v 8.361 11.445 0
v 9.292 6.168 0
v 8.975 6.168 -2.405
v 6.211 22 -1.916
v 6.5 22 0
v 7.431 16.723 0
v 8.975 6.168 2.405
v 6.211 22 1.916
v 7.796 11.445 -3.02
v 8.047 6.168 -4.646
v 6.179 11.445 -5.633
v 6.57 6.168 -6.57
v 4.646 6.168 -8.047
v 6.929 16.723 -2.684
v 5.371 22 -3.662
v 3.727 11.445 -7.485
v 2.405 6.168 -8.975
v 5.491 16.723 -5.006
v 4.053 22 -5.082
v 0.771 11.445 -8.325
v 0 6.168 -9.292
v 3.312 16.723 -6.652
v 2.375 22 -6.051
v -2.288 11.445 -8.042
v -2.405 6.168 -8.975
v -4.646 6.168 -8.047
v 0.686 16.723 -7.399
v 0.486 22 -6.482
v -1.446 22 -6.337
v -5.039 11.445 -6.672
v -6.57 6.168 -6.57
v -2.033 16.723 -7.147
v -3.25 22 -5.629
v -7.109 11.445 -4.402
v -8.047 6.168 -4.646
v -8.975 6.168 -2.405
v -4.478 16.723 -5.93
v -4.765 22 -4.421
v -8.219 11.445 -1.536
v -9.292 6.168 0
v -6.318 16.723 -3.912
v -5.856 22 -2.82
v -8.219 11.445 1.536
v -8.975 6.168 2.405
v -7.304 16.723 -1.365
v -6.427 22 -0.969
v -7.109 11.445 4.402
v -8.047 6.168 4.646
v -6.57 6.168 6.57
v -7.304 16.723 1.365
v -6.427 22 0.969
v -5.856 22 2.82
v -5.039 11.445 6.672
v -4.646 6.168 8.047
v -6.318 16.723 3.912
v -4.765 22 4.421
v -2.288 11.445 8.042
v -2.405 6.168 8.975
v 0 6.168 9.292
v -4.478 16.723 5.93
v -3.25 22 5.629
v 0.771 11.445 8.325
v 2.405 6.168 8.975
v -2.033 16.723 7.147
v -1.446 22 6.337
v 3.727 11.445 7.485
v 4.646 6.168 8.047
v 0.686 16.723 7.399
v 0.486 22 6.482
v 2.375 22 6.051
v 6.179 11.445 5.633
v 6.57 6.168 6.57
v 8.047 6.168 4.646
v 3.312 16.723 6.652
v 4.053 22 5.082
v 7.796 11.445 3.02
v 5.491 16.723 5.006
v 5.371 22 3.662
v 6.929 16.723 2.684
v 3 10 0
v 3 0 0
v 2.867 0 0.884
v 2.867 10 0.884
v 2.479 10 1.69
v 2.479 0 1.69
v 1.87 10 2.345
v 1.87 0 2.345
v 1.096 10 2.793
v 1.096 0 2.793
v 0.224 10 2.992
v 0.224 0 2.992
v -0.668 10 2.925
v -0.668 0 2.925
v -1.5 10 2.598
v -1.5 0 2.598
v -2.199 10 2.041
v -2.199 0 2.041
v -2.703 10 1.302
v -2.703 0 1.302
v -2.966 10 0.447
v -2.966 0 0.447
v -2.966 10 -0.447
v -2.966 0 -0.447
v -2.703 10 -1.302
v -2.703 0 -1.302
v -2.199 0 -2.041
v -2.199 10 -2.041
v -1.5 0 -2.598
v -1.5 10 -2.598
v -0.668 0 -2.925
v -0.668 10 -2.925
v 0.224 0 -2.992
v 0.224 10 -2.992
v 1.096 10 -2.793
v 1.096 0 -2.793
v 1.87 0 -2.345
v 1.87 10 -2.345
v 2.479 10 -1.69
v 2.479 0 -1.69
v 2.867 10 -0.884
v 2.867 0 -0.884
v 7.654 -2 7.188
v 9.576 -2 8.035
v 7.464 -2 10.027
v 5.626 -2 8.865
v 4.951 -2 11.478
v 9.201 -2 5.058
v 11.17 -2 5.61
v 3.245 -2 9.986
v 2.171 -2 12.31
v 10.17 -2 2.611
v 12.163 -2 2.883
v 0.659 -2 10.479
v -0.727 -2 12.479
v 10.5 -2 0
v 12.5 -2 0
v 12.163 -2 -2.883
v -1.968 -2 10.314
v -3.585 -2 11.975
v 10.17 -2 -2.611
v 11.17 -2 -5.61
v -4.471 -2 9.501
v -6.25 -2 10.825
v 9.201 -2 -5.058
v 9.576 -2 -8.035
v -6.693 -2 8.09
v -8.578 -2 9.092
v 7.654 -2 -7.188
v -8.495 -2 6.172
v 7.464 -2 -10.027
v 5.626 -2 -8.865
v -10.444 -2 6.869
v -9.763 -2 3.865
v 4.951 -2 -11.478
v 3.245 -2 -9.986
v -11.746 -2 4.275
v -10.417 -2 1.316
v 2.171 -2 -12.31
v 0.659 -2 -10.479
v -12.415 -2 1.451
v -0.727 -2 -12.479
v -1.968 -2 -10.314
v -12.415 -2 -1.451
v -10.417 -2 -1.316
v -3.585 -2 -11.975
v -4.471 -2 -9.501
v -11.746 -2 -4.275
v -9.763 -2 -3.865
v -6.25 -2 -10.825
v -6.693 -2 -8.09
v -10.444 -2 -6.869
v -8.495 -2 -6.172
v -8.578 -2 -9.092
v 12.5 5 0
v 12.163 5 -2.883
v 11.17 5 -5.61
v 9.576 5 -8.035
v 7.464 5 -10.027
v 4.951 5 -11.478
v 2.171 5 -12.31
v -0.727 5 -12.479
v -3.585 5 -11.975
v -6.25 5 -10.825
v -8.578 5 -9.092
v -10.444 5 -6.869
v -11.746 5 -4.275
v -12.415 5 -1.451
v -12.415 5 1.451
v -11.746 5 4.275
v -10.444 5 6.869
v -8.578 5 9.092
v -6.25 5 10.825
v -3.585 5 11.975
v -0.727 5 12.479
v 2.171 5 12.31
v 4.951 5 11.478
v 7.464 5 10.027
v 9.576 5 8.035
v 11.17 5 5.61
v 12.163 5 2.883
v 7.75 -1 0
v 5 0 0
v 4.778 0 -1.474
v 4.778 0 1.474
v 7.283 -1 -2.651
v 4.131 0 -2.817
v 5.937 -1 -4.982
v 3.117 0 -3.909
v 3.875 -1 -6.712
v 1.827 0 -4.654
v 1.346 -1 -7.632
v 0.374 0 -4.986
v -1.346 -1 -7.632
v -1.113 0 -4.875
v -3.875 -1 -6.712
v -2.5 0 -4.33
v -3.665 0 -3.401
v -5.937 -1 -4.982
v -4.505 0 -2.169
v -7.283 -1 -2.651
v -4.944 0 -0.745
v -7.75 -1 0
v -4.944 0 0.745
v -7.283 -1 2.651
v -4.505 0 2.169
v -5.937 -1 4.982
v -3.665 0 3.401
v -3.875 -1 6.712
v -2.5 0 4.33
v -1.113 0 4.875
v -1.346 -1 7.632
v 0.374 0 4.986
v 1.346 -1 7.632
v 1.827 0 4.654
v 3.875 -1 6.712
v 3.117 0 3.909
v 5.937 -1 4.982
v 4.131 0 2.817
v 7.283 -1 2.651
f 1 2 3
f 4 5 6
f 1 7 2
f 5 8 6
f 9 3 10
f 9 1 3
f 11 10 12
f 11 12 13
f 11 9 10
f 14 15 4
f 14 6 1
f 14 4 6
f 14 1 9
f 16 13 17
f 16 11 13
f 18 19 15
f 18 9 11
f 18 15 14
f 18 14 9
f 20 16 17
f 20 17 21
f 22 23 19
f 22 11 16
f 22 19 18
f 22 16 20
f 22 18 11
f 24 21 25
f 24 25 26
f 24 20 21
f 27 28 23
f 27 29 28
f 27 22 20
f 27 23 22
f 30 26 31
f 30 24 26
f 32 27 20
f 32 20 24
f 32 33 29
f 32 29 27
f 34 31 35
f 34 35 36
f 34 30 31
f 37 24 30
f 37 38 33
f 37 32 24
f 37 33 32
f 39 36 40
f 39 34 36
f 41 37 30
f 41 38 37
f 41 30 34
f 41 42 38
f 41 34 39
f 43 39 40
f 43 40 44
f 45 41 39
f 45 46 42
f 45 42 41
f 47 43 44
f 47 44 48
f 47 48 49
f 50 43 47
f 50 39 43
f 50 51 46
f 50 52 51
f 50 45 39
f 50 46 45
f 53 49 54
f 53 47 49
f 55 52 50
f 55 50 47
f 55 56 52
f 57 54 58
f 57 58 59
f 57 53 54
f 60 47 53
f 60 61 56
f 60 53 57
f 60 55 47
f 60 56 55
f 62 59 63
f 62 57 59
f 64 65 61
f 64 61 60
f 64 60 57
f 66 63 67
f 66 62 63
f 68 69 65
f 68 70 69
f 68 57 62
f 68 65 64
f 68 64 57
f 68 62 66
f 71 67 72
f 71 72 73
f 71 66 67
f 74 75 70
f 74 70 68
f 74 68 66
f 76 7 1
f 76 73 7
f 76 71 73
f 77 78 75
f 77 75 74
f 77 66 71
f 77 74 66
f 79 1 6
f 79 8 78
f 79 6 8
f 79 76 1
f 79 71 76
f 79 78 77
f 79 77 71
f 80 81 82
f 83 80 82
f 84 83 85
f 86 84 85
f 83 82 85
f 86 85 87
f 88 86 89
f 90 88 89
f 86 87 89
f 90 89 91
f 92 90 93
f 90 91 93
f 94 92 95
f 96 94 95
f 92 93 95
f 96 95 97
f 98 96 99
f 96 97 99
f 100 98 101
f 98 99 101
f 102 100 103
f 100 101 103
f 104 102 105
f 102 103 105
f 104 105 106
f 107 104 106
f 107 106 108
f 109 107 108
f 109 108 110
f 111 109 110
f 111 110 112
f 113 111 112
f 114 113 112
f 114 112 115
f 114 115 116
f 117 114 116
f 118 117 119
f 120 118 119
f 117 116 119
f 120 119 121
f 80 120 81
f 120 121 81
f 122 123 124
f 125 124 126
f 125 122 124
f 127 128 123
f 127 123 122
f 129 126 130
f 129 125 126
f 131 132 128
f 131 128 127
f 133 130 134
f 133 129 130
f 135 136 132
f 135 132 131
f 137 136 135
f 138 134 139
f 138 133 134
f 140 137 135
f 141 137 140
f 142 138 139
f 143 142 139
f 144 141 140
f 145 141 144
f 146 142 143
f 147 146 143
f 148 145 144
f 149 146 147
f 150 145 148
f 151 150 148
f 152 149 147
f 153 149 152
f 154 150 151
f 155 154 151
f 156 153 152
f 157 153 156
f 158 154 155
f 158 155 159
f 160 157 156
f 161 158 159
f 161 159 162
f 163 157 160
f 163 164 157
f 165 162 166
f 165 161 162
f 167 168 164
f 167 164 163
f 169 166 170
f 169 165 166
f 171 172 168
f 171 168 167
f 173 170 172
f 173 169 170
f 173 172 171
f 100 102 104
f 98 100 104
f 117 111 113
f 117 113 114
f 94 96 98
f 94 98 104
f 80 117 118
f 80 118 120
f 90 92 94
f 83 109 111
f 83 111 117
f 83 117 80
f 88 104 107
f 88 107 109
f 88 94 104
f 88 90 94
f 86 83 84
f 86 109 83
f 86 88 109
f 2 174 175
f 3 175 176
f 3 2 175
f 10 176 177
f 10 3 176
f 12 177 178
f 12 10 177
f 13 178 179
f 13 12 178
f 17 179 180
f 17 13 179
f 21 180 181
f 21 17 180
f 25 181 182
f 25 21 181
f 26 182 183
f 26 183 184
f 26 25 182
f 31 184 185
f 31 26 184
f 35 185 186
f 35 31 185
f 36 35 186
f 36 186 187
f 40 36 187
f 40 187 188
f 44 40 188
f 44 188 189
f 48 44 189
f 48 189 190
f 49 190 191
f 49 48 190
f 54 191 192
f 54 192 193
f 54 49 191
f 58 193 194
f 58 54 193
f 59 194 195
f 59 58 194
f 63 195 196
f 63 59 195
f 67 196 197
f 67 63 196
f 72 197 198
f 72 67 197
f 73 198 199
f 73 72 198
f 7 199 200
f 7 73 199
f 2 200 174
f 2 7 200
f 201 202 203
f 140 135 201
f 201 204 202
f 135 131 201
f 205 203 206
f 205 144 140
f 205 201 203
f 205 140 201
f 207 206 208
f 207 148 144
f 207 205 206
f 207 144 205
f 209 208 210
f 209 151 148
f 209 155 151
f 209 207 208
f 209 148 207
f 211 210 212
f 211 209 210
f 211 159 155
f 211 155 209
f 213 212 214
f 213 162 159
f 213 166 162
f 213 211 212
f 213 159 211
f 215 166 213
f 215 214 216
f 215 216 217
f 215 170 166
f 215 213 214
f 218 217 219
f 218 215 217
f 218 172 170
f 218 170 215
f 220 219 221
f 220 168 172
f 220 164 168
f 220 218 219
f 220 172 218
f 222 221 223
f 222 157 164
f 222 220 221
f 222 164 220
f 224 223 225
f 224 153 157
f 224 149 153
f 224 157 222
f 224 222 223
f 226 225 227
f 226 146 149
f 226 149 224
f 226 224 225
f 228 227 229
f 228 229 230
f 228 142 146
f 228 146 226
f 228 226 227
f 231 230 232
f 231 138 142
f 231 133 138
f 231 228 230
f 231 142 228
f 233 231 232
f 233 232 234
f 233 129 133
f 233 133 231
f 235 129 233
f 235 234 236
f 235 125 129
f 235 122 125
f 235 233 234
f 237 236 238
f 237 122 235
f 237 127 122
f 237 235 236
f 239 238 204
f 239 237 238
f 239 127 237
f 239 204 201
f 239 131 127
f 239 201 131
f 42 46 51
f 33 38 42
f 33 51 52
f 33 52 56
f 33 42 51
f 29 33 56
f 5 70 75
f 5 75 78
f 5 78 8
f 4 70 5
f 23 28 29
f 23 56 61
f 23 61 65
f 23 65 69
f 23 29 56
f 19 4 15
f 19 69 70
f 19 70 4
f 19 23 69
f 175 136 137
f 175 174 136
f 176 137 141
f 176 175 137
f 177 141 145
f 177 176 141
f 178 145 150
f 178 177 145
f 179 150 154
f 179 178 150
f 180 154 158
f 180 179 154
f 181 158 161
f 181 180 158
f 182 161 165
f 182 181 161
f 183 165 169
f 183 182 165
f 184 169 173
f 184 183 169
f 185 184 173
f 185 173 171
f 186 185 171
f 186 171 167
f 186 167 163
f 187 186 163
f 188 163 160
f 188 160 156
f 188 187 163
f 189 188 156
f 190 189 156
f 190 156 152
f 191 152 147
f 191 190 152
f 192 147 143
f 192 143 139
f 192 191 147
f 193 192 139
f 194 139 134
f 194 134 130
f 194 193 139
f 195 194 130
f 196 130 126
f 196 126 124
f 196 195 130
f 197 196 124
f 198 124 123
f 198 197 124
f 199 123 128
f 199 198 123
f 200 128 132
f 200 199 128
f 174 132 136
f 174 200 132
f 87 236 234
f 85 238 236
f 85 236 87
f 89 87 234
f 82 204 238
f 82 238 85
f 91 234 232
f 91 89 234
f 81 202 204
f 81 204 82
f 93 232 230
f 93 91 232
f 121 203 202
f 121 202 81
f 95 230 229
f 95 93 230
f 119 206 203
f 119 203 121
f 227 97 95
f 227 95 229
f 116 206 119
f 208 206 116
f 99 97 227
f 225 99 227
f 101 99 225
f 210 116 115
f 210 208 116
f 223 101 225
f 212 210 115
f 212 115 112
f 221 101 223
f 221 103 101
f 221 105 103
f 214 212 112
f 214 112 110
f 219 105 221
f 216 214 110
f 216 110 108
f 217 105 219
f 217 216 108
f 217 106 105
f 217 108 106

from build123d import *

# Parameters (mm, degrees)
SKETCH3_R          = 3
CUT_EXTRUDE1_DEPTH = 10


with BuildPart() as part:
    # Sketch2 → Revolve1 (revolve)
    with BuildSketch(Plane.XY):
        Polygon((0, 0), (5, 0), (10.5, -2), (12.5, -2), (12.5, 5), (9.291654184, 6.167742378), (6.5, 22), (0, 22), align=None)
    revolve(axis=Axis((0, -4.501967694, 0), (0, 1, 0)))

    # Sketch3 → Cut-Extrude1 (cut)
    with BuildSketch(Plane.XZ):
        Circle(SKETCH3_R)
    extrude(amount=-CUT_EXTRUDE1_DEPTH, mode=Mode.SUBTRACT)


solid = part.part
